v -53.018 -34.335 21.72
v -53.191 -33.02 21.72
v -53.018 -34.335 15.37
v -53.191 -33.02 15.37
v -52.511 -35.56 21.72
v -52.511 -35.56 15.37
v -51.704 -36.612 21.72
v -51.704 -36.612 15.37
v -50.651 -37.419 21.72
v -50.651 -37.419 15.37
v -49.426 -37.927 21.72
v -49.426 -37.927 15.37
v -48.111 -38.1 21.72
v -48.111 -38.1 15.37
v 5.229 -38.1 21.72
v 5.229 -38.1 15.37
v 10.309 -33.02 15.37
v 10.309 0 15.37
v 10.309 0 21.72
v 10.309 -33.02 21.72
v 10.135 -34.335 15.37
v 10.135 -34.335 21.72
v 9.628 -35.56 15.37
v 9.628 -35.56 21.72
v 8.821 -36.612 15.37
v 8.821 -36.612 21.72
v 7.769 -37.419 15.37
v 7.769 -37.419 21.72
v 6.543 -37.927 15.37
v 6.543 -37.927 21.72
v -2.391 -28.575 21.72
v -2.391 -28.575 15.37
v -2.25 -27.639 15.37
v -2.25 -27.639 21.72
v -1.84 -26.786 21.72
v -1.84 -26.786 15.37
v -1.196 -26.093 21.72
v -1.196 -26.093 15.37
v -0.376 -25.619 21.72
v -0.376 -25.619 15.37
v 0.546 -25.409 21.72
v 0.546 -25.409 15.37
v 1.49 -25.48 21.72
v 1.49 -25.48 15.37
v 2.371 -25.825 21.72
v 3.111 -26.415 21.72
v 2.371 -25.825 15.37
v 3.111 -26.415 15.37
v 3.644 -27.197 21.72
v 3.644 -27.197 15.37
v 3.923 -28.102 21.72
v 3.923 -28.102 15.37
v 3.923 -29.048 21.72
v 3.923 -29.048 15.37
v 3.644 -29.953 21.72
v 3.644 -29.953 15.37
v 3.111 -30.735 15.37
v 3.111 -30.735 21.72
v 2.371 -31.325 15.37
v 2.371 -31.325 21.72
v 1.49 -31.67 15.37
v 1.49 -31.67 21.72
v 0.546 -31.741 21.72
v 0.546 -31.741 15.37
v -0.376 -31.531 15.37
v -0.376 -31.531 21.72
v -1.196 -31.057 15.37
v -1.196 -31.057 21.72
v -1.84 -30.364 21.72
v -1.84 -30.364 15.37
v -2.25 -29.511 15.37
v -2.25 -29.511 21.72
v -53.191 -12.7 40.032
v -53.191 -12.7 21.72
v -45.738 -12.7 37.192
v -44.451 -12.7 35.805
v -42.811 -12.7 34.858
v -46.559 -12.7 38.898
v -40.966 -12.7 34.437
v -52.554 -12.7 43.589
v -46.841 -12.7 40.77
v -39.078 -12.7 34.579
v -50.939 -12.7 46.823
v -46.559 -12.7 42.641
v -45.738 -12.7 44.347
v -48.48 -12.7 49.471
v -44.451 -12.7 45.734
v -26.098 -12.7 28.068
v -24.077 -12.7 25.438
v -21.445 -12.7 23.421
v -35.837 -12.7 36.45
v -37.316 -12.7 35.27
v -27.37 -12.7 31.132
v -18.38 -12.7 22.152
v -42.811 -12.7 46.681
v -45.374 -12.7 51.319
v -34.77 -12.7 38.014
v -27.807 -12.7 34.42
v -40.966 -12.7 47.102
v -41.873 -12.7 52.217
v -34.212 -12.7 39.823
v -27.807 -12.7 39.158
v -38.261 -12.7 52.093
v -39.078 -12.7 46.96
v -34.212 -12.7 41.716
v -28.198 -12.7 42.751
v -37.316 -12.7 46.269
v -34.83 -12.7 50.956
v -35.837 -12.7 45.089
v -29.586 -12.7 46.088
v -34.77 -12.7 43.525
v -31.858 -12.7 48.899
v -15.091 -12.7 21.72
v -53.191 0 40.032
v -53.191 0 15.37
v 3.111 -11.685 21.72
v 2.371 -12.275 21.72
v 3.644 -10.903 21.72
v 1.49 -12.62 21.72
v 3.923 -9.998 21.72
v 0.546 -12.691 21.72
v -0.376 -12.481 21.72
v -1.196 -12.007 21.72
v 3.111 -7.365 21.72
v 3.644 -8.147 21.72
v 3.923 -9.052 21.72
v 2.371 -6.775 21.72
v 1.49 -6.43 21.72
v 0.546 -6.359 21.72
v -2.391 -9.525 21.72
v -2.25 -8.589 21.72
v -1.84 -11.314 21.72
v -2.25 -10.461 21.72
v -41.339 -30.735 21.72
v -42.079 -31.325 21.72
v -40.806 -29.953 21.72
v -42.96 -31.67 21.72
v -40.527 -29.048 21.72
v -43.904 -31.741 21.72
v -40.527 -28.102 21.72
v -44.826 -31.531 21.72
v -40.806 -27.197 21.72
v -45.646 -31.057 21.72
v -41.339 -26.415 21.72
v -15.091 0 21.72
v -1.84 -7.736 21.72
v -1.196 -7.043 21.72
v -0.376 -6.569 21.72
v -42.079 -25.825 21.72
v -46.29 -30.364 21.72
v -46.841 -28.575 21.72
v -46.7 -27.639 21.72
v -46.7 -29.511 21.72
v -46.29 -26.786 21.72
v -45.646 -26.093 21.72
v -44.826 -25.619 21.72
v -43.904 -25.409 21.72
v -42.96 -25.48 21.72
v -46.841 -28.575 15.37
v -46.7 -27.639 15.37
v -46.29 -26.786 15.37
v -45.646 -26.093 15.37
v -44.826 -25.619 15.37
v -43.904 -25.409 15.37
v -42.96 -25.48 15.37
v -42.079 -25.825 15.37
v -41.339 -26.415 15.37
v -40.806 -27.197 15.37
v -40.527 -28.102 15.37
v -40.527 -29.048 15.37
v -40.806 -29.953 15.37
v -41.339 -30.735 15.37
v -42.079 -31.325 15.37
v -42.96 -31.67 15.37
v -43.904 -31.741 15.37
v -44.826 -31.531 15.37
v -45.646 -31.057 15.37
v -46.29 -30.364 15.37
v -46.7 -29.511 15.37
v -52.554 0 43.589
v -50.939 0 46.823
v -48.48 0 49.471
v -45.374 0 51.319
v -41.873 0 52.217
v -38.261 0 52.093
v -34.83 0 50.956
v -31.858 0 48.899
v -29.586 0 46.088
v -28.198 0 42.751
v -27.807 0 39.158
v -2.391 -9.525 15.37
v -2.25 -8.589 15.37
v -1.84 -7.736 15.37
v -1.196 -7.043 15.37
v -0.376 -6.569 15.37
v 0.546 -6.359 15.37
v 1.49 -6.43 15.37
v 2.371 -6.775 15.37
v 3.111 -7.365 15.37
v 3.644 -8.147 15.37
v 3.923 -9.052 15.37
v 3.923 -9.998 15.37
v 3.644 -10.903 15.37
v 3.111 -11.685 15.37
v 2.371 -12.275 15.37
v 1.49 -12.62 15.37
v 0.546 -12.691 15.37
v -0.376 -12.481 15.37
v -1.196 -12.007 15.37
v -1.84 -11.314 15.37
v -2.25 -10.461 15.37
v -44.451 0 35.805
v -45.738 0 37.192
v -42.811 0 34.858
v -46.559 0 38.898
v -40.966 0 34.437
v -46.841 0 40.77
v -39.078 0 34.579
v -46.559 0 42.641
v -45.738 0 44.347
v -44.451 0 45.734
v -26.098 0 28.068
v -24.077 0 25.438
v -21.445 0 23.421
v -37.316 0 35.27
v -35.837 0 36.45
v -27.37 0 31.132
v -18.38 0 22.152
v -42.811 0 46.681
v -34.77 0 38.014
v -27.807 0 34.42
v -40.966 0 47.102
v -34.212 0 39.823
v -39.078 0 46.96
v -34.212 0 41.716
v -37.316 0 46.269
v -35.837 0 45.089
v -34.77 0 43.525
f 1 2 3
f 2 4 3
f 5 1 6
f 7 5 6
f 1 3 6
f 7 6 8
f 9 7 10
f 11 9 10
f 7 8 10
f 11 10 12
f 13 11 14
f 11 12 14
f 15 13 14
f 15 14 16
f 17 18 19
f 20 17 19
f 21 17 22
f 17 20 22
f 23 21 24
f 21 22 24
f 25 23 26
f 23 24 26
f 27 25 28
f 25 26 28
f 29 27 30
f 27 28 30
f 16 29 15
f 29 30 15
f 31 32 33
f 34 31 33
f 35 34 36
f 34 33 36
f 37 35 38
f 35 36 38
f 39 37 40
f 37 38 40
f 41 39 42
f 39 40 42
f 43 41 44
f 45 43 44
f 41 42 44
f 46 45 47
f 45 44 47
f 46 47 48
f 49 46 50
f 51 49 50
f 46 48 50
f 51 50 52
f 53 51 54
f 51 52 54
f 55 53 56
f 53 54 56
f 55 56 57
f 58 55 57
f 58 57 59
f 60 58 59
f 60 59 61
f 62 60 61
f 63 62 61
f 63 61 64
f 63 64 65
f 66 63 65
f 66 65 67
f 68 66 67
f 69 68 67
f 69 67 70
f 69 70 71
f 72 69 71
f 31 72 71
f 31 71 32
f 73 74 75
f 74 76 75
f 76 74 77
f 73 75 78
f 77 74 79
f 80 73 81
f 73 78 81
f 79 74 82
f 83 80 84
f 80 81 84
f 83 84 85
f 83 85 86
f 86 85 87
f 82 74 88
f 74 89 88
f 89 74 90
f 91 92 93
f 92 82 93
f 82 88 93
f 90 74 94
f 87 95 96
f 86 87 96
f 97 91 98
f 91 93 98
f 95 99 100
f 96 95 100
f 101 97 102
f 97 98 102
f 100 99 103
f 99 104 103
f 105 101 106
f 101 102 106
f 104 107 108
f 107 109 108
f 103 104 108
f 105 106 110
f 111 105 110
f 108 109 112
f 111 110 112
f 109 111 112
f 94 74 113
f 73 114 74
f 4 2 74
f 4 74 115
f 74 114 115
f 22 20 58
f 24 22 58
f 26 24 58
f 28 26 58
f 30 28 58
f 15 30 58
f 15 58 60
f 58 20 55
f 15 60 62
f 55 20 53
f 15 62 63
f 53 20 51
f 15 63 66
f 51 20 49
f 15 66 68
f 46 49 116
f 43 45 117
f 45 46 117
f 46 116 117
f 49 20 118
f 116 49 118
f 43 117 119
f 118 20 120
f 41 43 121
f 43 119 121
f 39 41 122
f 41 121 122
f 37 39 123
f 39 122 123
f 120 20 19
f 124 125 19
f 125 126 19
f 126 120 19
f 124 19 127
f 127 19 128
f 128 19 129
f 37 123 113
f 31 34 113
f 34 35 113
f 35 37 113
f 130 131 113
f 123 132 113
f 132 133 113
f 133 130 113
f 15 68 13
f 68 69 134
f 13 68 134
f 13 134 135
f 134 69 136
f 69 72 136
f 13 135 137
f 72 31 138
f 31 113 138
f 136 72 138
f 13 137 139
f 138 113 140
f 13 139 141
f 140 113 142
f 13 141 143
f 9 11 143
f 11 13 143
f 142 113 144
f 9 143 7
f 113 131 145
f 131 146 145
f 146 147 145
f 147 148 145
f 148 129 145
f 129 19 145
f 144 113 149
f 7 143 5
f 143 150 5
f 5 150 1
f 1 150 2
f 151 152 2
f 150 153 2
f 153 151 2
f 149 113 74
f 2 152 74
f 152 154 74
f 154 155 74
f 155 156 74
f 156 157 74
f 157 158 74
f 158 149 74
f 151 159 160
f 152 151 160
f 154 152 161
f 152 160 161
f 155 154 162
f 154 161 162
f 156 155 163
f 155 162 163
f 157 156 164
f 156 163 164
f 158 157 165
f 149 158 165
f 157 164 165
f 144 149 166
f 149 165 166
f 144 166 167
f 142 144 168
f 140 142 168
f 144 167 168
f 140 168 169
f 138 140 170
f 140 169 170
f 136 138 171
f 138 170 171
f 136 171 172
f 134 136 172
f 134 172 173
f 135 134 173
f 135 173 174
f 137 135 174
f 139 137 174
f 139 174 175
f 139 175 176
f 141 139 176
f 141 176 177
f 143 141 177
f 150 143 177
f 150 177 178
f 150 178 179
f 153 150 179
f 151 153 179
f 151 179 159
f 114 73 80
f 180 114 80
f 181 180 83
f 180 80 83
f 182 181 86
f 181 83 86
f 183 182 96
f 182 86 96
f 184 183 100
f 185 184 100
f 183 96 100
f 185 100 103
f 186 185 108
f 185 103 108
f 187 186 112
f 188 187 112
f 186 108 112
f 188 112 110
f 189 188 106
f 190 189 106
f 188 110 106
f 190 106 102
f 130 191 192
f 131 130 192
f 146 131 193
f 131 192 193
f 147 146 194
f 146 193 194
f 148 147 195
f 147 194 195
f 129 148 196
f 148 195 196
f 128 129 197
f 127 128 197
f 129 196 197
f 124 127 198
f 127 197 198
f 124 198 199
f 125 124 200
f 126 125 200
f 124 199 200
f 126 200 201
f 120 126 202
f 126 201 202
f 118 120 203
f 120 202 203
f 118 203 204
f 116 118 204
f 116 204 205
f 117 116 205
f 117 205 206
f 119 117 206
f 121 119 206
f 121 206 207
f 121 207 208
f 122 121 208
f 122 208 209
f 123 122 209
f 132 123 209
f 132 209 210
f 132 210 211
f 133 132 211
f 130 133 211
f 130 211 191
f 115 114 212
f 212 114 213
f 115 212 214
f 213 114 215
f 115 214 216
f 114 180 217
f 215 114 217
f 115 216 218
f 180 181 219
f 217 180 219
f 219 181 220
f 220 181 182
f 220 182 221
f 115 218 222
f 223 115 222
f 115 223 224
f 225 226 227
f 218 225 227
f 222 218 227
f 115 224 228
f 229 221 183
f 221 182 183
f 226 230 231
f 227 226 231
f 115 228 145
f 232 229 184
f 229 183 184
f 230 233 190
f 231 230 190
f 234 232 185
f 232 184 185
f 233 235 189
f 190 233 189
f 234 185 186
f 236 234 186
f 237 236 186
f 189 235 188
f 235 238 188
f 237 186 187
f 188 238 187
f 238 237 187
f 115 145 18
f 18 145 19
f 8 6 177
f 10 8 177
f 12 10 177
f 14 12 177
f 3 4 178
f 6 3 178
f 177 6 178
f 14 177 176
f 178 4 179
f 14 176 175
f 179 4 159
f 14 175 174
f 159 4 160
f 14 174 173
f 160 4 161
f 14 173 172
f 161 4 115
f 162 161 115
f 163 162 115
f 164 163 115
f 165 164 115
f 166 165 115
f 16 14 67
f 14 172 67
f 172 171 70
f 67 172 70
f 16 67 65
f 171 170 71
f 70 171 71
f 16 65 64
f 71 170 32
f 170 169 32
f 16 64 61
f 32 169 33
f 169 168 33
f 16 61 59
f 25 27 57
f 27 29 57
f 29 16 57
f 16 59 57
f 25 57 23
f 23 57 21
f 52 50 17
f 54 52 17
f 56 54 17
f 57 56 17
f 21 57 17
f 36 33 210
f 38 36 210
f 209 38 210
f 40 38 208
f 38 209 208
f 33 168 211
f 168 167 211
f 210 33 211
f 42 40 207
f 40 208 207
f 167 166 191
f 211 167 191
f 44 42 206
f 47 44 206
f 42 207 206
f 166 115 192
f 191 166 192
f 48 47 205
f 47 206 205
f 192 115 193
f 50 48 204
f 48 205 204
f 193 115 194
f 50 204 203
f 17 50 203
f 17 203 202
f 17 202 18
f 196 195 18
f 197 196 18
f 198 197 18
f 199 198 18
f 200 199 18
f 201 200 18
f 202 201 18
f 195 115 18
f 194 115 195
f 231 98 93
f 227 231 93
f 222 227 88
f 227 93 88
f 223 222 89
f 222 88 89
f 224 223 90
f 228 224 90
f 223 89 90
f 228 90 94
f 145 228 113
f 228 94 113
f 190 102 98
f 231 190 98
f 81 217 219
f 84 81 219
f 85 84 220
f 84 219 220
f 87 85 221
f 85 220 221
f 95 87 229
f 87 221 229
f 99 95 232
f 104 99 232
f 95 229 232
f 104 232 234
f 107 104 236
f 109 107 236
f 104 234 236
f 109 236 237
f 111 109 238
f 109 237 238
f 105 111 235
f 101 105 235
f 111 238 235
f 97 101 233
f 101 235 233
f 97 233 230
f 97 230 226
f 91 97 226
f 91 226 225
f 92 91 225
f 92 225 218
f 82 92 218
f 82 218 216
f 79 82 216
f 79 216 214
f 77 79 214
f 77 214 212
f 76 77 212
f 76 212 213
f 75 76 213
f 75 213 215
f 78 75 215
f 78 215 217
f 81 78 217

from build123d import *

# Parameters (mm, degrees)
F2_DEPTH  = 38.1
F3_W      = 25.4
F3_H      = 31.75
F4_DEPTH  = 25.4
F5_DEPTH  = 12.7
F7_D      = 12.7
F9_DEPTH  = 12.7
F10_DEPTH = 123
F11_R     = 5.08
F13_D     = 6.35
F15_D     = 6.35
F17_D     = 6.35


# Not quite as in the source:
# - an extrude ends at something that could not be found from the text; its depth is read off the source's solid


with BuildPart() as f2:
    # F0 (on Front) → F2 (new body)
    with BuildSketch(Plane.XZ):
        Polygon((-15.0914756011, 53.4695235106), (-53.1914756011, 53.4695235106), (-53.1914756011, 15.3695235106), (10.3085243989, 15.3695235106), (10.3085243989, 21.7195235106), (-15.0914756011, 21.7195235106), align=None)
    extrude(amount=F2_DEPTH)

    # F3 (on face) → F4 (cut)
    with BuildSketch(Plane.YZ.offset(-15.0914756011)):
        with Locations((-25.4, 37.5945235106)):
            Rectangle(F3_W, F3_H)
    extrude(amount=-F4_DEPTH, mode=Mode.SUBTRACT)

    # F5 (cut): a face of the model
    f5_faces = [f2.faces().sort_by_distance(p)[0] for p in [
        (-40.4914756011, -25.4, 37.5945235106),
    ]]
    extrude(f5_faces, amount=-F5_DEPTH, mode=Mode.SUBTRACT)

    # F7 (through all)
    with Locations(Plane.XZ.offset(12.7)):
        with Locations((-40.4914756011, 40.7695235106)):
            Hole(F7_D / 2)

    # F8 (on face) → F9 (cut)
    with BuildSketch(Plane.XZ.offset(12.7)):
        with BuildLine():
            ThreePointArc((-53.1914756011, 40.0317125094), (-40.0621213537, 52.2842661721), (-27.8065160195, 39.1577604642))
            Line((-27.8065160195, 39.1577604642), (-27.8065160195, 34.4195235106))
            ThreePointArc((-27.8065160195, 34.4195235106), (-24.0770508865, 25.4383560684), (-15.0914756011, 21.7195235106))
            Line((-15.0914756011, 21.7195235106), (-15.0914756011, 53.4695235106))
            Line((-15.0914756011, 53.4695235106), (-53.1914756011, 53.4695235106))
            Line((-53.1914756011, 53.4695235106), (-53.1914756011, 40.0317125094))
        make_face()
    extrude(amount=-F9_DEPTH, mode=Mode.SUBTRACT)

    # F1 (on face) → F10 (cut, through all)
    with BuildSketch(Plane.XZ):
        Polygon((-15.0914756011, 21.7195235106), (-15.0914756011, 53.4695235106), (-53.1914756011, 53.4695235106), (-53.1914756011, 15.3695235106), (10.3085243989, 15.3695235106), (10.3085243989, 21.7195235106), align=None)
    extrude(amount=-F10_DEPTH, mode=Mode.SUBTRACT)

    # F11
    f11_edges = [f2.edges().sort_by_distance(p)[0] for p in [
        (-53.191476, -38.1, 18.544524),
        (10.308524, -38.1, 18.544524),
    ]]
    fillet(f11_edges, radius=F11_R)

    # F13 (through all)
    with Locations(Plane.XY.offset(21.7195235106)):
        with Locations((-43.6664756011, -28.575)):
            Hole(F13_D / 2)

    # F15 (through all)
    with Locations(Plane.XY.offset(21.7195235106)):
        with Locations((0.7835243989, -9.525)):
            Hole(F15_D / 2)

    # F17 (through all)
    with Locations(Plane.XY.offset(21.7195235106)):
        with Locations((0.7835243989, -28.575)):
            Hole(F17_D / 2)


solid = f2.part
